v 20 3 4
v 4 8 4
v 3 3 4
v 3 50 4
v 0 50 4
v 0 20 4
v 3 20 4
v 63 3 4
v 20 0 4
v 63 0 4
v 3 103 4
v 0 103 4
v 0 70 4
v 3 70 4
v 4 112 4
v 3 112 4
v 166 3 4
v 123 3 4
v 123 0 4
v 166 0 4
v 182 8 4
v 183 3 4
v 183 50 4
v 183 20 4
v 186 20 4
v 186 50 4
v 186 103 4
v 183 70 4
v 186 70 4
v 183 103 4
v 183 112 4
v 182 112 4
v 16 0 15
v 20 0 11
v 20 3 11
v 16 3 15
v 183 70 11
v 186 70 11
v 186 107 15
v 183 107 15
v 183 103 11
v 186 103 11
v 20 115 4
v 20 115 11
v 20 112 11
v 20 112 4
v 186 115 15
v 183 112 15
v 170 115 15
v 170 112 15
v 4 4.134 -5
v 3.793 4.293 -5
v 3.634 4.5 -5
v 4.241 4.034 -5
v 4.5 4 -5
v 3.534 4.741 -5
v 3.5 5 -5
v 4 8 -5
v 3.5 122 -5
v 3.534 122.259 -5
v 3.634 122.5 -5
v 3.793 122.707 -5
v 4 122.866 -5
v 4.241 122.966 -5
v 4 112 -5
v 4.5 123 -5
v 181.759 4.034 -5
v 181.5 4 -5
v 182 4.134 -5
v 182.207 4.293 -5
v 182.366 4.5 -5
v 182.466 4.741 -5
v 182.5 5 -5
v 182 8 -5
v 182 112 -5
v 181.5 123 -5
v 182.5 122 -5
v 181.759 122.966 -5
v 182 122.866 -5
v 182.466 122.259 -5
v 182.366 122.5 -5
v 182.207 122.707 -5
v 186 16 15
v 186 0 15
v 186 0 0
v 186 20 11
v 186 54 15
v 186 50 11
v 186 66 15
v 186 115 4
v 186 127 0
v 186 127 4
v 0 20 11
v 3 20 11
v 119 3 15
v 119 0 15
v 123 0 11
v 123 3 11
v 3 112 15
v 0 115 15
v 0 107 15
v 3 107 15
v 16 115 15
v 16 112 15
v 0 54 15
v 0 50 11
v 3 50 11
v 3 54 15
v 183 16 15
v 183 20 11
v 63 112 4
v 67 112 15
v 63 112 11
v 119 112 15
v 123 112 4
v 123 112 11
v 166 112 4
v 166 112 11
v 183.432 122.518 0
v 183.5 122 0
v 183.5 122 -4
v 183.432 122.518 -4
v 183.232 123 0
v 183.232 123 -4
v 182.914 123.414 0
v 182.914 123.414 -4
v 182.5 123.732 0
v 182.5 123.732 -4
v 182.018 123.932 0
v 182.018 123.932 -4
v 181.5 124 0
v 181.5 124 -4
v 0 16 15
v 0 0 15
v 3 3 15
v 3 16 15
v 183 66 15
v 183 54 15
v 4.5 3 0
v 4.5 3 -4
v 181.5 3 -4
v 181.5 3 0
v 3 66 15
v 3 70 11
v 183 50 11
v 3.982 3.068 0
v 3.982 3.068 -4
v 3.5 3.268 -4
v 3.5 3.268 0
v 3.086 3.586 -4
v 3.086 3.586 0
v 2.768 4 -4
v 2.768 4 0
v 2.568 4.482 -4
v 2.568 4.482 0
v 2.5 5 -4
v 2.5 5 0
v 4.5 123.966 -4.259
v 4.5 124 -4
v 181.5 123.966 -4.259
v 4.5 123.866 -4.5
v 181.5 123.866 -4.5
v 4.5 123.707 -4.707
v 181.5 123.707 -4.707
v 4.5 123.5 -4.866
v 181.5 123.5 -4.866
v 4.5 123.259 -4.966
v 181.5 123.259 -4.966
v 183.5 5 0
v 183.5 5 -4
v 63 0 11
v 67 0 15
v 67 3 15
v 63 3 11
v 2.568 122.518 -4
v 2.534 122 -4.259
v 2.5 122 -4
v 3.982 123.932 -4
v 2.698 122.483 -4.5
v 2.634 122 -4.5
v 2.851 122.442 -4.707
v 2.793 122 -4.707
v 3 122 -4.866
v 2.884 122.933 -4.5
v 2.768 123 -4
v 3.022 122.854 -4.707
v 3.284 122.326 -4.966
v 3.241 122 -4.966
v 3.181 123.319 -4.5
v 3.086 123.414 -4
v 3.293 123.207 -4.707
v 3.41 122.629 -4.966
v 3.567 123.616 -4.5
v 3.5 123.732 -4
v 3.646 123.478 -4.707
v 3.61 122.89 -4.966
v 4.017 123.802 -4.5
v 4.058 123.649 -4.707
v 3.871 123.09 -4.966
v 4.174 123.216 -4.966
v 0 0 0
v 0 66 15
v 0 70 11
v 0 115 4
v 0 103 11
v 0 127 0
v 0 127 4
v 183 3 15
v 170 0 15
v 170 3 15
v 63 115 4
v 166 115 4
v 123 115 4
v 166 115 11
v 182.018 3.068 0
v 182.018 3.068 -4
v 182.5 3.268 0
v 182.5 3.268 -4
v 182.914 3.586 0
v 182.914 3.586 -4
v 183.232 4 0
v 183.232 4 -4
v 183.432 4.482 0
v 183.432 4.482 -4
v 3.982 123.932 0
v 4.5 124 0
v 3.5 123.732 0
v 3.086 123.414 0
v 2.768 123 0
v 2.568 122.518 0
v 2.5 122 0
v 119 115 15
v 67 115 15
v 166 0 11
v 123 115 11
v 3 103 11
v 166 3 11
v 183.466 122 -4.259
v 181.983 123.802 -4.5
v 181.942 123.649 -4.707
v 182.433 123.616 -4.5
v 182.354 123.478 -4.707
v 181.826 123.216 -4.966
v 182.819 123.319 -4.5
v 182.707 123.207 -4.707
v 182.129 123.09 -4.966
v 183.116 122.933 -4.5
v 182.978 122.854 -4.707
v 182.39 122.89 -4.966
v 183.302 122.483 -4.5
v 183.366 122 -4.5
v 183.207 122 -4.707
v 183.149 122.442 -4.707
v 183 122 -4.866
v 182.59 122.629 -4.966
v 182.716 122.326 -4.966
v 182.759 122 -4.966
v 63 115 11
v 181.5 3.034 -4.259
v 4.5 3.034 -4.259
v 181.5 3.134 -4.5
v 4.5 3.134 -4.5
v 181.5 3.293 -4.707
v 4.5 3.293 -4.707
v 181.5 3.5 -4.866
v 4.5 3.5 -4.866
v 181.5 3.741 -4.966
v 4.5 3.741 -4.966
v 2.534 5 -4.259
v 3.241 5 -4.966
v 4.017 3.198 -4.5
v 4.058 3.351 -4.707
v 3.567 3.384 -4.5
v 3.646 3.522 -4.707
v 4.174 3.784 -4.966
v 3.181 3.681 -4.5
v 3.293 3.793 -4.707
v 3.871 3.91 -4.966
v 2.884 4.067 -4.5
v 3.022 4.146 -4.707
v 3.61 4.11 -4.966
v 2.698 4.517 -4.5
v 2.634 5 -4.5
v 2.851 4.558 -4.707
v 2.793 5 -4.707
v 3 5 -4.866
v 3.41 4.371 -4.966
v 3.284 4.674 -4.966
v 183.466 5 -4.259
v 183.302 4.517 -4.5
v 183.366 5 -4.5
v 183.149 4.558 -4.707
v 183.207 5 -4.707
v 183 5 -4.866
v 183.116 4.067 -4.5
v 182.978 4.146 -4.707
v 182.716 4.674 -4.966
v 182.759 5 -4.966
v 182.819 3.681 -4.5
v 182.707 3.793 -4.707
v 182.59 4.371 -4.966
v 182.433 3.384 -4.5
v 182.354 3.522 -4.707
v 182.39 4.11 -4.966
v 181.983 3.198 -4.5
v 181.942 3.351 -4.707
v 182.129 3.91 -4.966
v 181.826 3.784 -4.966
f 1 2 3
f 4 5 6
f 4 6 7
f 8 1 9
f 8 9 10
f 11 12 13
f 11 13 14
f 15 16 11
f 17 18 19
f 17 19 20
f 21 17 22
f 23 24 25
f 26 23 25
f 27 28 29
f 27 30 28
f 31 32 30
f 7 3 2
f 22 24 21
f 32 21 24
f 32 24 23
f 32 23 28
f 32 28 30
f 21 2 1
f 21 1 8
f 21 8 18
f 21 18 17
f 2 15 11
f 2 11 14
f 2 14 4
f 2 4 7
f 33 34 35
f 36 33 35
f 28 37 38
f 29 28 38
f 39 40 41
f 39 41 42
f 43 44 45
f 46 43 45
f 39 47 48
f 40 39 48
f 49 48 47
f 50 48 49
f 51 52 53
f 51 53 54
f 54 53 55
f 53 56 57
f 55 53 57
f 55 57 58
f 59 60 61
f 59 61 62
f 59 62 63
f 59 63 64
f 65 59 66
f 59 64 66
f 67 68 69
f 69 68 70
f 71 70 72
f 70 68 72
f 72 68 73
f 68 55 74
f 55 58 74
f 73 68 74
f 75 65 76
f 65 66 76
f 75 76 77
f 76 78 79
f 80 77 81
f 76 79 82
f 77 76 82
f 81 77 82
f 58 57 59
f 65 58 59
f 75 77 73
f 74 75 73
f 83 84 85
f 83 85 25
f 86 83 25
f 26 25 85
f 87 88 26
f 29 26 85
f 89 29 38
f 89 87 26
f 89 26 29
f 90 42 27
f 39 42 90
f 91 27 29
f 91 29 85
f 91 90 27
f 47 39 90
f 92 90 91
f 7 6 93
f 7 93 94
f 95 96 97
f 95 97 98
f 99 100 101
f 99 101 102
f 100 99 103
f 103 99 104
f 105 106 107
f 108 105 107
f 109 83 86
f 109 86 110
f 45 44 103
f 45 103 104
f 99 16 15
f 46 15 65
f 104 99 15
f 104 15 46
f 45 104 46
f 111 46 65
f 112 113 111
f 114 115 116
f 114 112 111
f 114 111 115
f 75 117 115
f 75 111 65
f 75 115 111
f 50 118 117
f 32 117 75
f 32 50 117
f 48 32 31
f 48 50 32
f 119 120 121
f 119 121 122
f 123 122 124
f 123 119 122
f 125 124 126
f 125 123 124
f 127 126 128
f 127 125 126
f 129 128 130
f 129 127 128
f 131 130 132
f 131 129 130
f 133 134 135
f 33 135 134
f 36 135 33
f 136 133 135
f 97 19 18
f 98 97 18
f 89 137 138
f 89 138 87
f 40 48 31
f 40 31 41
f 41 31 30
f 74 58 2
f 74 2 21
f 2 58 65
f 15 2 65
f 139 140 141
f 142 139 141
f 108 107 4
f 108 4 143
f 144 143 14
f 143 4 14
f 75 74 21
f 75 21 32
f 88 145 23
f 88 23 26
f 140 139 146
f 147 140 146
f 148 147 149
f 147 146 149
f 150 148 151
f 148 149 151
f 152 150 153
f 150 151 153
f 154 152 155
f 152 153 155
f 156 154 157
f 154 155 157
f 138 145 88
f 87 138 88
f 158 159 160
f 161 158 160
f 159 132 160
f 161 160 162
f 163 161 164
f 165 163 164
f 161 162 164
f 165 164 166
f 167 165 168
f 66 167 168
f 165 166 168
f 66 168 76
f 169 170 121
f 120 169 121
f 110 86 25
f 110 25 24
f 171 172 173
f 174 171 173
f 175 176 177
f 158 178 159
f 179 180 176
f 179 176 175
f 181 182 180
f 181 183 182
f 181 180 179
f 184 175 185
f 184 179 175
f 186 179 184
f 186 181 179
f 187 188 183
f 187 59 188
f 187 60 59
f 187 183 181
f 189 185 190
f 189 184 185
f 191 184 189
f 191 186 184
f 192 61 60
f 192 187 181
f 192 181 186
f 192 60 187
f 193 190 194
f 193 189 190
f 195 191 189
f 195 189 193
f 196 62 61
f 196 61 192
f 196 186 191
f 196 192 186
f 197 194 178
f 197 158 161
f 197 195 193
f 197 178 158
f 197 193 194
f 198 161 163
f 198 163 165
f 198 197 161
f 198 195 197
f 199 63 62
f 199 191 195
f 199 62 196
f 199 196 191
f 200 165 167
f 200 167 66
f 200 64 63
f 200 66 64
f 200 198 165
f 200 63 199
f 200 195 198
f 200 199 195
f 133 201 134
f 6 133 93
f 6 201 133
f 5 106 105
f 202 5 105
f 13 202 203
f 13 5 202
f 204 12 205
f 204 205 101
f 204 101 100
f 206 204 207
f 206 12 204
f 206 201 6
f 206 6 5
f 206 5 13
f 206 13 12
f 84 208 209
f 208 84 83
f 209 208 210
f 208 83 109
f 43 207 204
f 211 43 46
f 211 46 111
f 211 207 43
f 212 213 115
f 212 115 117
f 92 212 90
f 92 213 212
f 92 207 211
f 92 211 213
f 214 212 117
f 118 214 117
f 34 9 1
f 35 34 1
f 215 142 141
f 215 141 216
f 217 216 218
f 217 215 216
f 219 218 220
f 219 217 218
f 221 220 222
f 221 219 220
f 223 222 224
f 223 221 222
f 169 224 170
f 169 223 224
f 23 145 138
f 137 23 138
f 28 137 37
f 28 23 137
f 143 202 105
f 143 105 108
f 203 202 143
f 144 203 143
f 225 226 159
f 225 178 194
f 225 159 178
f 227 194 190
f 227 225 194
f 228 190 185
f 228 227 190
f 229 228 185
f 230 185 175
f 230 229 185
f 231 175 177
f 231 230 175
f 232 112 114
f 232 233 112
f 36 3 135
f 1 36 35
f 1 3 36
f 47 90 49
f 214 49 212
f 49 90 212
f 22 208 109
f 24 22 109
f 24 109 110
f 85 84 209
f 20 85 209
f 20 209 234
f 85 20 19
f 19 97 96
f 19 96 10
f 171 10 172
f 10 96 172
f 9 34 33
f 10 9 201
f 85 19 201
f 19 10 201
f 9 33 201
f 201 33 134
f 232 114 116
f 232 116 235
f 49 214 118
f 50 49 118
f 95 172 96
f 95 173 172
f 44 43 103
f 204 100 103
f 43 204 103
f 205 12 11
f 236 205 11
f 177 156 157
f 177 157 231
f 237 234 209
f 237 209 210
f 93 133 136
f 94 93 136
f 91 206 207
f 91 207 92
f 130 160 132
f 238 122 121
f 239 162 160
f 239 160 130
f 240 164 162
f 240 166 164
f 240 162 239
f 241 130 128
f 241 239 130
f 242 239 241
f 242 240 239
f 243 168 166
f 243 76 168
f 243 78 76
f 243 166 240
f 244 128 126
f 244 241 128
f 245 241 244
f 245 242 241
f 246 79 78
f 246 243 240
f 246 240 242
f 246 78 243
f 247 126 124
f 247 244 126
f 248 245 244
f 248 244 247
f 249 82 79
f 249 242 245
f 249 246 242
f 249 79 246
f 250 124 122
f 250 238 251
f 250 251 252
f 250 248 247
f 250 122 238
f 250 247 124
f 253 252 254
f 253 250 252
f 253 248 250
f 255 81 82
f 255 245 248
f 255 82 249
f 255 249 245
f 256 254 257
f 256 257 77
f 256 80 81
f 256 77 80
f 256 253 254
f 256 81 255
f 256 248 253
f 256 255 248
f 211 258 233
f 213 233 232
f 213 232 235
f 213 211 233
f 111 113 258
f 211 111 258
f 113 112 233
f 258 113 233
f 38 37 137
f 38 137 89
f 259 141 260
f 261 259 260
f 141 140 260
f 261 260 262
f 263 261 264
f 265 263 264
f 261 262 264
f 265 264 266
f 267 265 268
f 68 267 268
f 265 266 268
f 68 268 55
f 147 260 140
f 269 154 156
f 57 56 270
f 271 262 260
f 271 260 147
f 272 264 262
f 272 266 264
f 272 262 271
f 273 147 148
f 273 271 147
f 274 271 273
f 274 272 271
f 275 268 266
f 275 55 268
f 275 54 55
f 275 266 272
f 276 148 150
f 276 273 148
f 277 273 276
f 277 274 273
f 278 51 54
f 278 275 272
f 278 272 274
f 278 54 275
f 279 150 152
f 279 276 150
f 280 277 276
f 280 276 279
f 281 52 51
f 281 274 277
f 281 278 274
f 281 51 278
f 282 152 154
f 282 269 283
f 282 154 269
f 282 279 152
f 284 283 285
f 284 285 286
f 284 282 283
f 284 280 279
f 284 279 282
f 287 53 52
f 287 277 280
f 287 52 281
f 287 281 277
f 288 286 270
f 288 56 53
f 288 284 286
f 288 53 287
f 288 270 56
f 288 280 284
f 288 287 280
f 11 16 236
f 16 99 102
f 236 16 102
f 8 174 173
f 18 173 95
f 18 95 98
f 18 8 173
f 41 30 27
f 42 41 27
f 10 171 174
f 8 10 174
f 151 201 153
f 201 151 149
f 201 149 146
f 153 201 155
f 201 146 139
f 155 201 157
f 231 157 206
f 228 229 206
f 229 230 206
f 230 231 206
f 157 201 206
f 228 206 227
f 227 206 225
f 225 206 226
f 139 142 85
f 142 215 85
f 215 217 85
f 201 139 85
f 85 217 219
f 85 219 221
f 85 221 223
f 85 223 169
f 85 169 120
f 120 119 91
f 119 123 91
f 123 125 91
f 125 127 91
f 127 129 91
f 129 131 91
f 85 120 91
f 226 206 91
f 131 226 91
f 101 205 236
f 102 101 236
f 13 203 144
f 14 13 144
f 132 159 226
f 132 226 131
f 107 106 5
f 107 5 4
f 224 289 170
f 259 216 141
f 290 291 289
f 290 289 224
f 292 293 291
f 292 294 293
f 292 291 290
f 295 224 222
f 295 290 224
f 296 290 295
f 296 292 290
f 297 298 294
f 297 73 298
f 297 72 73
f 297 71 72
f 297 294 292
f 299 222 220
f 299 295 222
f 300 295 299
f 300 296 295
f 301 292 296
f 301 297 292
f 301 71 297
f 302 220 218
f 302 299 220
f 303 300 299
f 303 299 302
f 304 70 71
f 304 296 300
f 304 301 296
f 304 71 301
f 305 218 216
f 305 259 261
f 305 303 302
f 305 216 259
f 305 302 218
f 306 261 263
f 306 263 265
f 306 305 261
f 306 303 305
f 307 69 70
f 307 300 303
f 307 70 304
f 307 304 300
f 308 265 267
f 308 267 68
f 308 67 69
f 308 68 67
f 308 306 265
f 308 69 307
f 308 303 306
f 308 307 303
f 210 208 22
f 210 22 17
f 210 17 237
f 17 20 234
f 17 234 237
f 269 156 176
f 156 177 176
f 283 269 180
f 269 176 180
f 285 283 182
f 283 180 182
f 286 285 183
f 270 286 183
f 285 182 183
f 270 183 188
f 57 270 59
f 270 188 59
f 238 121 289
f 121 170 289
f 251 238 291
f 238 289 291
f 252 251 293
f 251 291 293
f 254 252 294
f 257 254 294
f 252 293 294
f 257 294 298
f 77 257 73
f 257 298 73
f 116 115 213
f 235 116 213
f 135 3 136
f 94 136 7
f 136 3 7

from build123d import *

# Parameters (mm, degrees)
BOX035_W               = 60
BOX035_H               = 3
BOX035_DEPTH           = 11
BOX034_W               = 200
BOX034_H               = 30
BOX034_DEPTH           = 20
BOX033_W               = 60
BOX033_H               = 3
BOX033_DEPTH           = 11
BOX025_W               = 3
BOX025_H               = 20
BOX025_DEPTH           = 11
BOX026_W               = 3
BOX026_H               = 20
BOX026_DEPTH           = 11
BOX024_W               = 30
BOX024_H               = 20
BOX024_DEPTH           = 11
BOX023_W               = 20
BOX023_H               = 20
BOX023_DEPTH           = 11
CUT010_PLACEMENT_ANGLE = 180
BOX032_W               = 30
BOX032_H               = 20
BOX032_DEPTH           = 11
BOX031_W               = 20
BOX031_H               = 20
BOX031_DEPTH           = 11
CUT013_PLACEMENT_ANGLE = 180
BOX030_W               = 30
BOX030_H               = 20
BOX030_DEPTH           = 11
BOX029_W               = 20
BOX029_H               = 20
BOX029_DEPTH           = 11
CUT012_PLACEMENT_ANGLE = 180
BOX022_W               = 30
BOX022_H               = 20
BOX022_DEPTH           = 11
BOX021_W               = 20
BOX021_H               = 20
BOX021_DEPTH           = 11
CHAMFER006_SIZE        = 4
BOX018_W               = 178
BOX018_H               = 104
BOX018_DEPTH           = 30
BOX019_W               = 181
BOX019_H               = 121
BOX019_DEPTH           = 5
BOX017_W               = 186
BOX017_H               = 127
BOX017_DEPTH           = 4
FILLET008_R            = 2
FILLET009_R            = 1


with BuildPart() as cube032:
    # Box035 → Box035 (new body)
    with BuildSketch(Plane(origin=(63, 0, 4), x_dir=(1, 0, 0), z_dir=(0, 0, 1))):
        with Locations((30, 1.5)):
            Rectangle(BOX035_W, BOX035_H)
    extrude(amount=BOX035_DEPTH)


with BuildPart() as cube031:
    # Box034 → Box034 (new body)
    with BuildSketch(Plane(origin=(-10, 73, -5), x_dir=(1, 0, 0), z_dir=(0, 0, 1))):
        with Locations((100, 15)):
            Rectangle(BOX034_W, BOX034_H)
    extrude(amount=BOX034_DEPTH)


with BuildPart() as cube030:
    # Box033 → Box033 (new body)
    with BuildSketch(Plane(origin=(63, 112, 4), x_dir=(1, 0, 0), z_dir=(0, 0, 1))):
        with Locations((30, 1.5)):
            Rectangle(BOX033_W, BOX033_H)
    extrude(amount=BOX033_DEPTH)


with BuildPart() as cube022:
    # Box025 → Box025 (new body)
    with BuildSketch(Plane(origin=(0, 50, 4), x_dir=(1, 0, 0), z_dir=(0, 0, 1))):
        with Locations((1.5, 10)):
            Rectangle(BOX025_W, BOX025_H)
    extrude(amount=BOX025_DEPTH)


with BuildPart() as cube023:
    # Box026 → Box026 (new body)
    with BuildSketch(Plane(origin=(183, 50, 4), x_dir=(1, 0, 0), z_dir=(0, 0, 1))):
        with Locations((1.5, 10)):
            Rectangle(BOX026_W, BOX026_H)
    extrude(amount=BOX026_DEPTH)


with BuildPart() as cube021:
    # Box024 → Box024 (new body)
    with BuildSketch(Plane(origin=(3, 3, 0), x_dir=(1, 0, 0), z_dir=(0, 0, 1))):
        with Locations((15, 10)):
            Rectangle(BOX024_W, BOX024_H)
    extrude(amount=BOX024_DEPTH)


with BuildPart() as cut010:
    # Box023 → Box023 (new body)
    with BuildSketch(Plane.XY):
        with Locations((10, 10)):
            Rectangle(BOX023_W, BOX023_H)
    extrude(amount=BOX023_DEPTH)

    # Cut010: cut Cube021
    add(cube021.part, mode=Mode.SUBTRACT)


with BuildPart() as cut010_1:
    # Cut010 placement: moved
    add(cut010.part.moved(Location((186, 0, 15))).rotate(Axis((186, 0, 15), (0, 1, 0)), CUT010_PLACEMENT_ANGLE))


with BuildPart() as cube029:
    # Box032 → Box032 (new body)
    with BuildSketch(Plane(origin=(3, 3, 0), x_dir=(1, 0, 0), z_dir=(0, 0, 1))):
        with Locations((15, 10)):
            Rectangle(BOX032_W, BOX032_H)
    extrude(amount=BOX032_DEPTH)


with BuildPart() as cut013:
    # Box031 → Box031 (new body)
    with BuildSketch(Plane.XY):
        with Locations((10, 10)):
            Rectangle(BOX031_W, BOX031_H)
    extrude(amount=BOX031_DEPTH)

    # Cut013: cut Cube029
    add(cube029.part, mode=Mode.SUBTRACT)


with BuildPart() as cut013_1:
    # Cut013 placement: moved
    add(cut013.part.moved(Location((186, 115, 4))).rotate(Axis((186, 115, 4), (0, 0, 1)), CUT013_PLACEMENT_ANGLE))


with BuildPart() as cube027:
    # Box030 → Box030 (new body)
    with BuildSketch(Plane(origin=(3, 3, 0), x_dir=(1, 0, 0), z_dir=(0, 0, 1))):
        with Locations((15, 10)):
            Rectangle(BOX030_W, BOX030_H)
    extrude(amount=BOX030_DEPTH)


with BuildPart() as cut012:
    # Box029 → Box029 (new body)
    with BuildSketch(Plane.XY):
        with Locations((10, 10)):
            Rectangle(BOX029_W, BOX029_H)
    extrude(amount=BOX029_DEPTH)

    # Cut012: cut Cube027
    add(cube027.part, mode=Mode.SUBTRACT)


with BuildPart() as cut012_1:
    # Cut012 placement: moved
    add(cut012.part.moved(Location((0, 115, 15))).rotate(Axis((0, 115, 15), (1, 0, 0)), CUT012_PLACEMENT_ANGLE))


with BuildPart() as cube019:
    # Box022 → Box022 (new body)
    with BuildSketch(Plane(origin=(3, 3, 0), x_dir=(1, 0, 0), z_dir=(0, 0, 1))):
        with Locations((15, 10)):
            Rectangle(BOX022_W, BOX022_H)
    extrude(amount=BOX022_DEPTH)


with BuildPart() as chamfer006:
    # Box021 → Box021 (new body)
    with BuildSketch(Plane.XY):
        with Locations((10, 10)):
            Rectangle(BOX021_W, BOX021_H)
    extrude(amount=BOX021_DEPTH)

    # Cut009: cut Cube019
    add(cube019.part, mode=Mode.SUBTRACT)


with BuildPart() as chamfer006_1:
    # Cut009 placement: moved
    add(chamfer006.part.moved(Location((0, 0, 4))))

    # Fusion014: union Cube022, Cube023, Cut010, Cut013, Cut012
    add(cube022.part)
    add(cube023.part)
    add(cut010_1.part)
    add(cut013_1.part)
    add(cut012_1.part)

    # Fusion015: union Cube030
    add(cube030.part)

    # Cut014: cut Cube031
    add(cube031.part, mode=Mode.SUBTRACT)

    # Fusion016: union Cube032
    add(cube032.part)

    # Chamfer006
    chamfer006_edges = [chamfer006_1.edges().sort_by_distance(p)[0] for p in [
        (184.5, 20, 15),
        (166, 1.5, 15),
        (63, 113.5, 15),
        (123, 113.5, 15),
        (1.5, 103, 15),
        (20, 113.5, 15),
        (184.5, 50, 15),
        (184.5, 70, 15),
        (184.5, 103, 15),
        (166, 113.5, 15),
        (63, 1.5, 15),
        (123, 1.5, 15),
        (1.5, 50, 15),
        (1.5, 70, 15),
        (1.5, 20, 15),
        (20, 1.5, 15),
    ]]
    chamfer(chamfer006_edges, length=CHAMFER006_SIZE)


with BuildPart() as cutout:
    # Box018 → Box018 (new body)
    with BuildSketch(Plane(origin=(4, 8, -25), x_dir=(1, 0, 0), z_dir=(0, 0, 1))):
        with Locations((89, 52)):
            Rectangle(BOX018_W, BOX018_H)
    extrude(amount=BOX018_DEPTH)


with BuildPart() as cube016:
    # Box019 → Box019 (new body)
    with BuildSketch(Plane(origin=(2.5, 3, -5), x_dir=(1, 0, 0), z_dir=(0, 0, 1))):
        with Locations((90.5, 60.5)):
            Rectangle(BOX019_W, BOX019_H)
    extrude(amount=BOX019_DEPTH)


with BuildPart() as fascia_complete:
    # Box017 → Box017 (new body)
    with BuildSketch(Plane.XY):
        with Locations((93, 63.5)):
            Rectangle(BOX017_W, BOX017_H)
    extrude(amount=BOX017_DEPTH)

    # Fusion007: union Cube016
    add(cube016.part)

    # Cut007: cut Cutout
    add(cutout.part, mode=Mode.SUBTRACT)

    # Fillet008
    fillet008_edges = [fascia_complete.edges().sort_by_distance(p)[0] for p in [
        (183.5, 124, -2.5),
        (2.5, 124, -2.5),
        (2.5, 3, -2.5),
        (183.5, 3, -2.5),
    ]]
    fillet(fillet008_edges, radius=FILLET008_R)

    # Fillet009
    fillet009_edges = [fascia_complete.edges().sort_by_distance(p)[0] for p in [
        (93, 124, -5),
        (3.085786, 123.414214, -5),
        (182.914214, 123.414214, -5),
        (2.5, 63.5, -5),
        (183.5, 63.5, -5),
        (3.085786, 3.585786, -5),
        (182.914214, 3.585786, -5),
        (93, 3, -5),
    ]]
    fillet(fillet009_edges, radius=FILLET009_R)

    # Fusion017: union Chamfer006
    add(chamfer006_1.part)


solid = fascia_complete.part
